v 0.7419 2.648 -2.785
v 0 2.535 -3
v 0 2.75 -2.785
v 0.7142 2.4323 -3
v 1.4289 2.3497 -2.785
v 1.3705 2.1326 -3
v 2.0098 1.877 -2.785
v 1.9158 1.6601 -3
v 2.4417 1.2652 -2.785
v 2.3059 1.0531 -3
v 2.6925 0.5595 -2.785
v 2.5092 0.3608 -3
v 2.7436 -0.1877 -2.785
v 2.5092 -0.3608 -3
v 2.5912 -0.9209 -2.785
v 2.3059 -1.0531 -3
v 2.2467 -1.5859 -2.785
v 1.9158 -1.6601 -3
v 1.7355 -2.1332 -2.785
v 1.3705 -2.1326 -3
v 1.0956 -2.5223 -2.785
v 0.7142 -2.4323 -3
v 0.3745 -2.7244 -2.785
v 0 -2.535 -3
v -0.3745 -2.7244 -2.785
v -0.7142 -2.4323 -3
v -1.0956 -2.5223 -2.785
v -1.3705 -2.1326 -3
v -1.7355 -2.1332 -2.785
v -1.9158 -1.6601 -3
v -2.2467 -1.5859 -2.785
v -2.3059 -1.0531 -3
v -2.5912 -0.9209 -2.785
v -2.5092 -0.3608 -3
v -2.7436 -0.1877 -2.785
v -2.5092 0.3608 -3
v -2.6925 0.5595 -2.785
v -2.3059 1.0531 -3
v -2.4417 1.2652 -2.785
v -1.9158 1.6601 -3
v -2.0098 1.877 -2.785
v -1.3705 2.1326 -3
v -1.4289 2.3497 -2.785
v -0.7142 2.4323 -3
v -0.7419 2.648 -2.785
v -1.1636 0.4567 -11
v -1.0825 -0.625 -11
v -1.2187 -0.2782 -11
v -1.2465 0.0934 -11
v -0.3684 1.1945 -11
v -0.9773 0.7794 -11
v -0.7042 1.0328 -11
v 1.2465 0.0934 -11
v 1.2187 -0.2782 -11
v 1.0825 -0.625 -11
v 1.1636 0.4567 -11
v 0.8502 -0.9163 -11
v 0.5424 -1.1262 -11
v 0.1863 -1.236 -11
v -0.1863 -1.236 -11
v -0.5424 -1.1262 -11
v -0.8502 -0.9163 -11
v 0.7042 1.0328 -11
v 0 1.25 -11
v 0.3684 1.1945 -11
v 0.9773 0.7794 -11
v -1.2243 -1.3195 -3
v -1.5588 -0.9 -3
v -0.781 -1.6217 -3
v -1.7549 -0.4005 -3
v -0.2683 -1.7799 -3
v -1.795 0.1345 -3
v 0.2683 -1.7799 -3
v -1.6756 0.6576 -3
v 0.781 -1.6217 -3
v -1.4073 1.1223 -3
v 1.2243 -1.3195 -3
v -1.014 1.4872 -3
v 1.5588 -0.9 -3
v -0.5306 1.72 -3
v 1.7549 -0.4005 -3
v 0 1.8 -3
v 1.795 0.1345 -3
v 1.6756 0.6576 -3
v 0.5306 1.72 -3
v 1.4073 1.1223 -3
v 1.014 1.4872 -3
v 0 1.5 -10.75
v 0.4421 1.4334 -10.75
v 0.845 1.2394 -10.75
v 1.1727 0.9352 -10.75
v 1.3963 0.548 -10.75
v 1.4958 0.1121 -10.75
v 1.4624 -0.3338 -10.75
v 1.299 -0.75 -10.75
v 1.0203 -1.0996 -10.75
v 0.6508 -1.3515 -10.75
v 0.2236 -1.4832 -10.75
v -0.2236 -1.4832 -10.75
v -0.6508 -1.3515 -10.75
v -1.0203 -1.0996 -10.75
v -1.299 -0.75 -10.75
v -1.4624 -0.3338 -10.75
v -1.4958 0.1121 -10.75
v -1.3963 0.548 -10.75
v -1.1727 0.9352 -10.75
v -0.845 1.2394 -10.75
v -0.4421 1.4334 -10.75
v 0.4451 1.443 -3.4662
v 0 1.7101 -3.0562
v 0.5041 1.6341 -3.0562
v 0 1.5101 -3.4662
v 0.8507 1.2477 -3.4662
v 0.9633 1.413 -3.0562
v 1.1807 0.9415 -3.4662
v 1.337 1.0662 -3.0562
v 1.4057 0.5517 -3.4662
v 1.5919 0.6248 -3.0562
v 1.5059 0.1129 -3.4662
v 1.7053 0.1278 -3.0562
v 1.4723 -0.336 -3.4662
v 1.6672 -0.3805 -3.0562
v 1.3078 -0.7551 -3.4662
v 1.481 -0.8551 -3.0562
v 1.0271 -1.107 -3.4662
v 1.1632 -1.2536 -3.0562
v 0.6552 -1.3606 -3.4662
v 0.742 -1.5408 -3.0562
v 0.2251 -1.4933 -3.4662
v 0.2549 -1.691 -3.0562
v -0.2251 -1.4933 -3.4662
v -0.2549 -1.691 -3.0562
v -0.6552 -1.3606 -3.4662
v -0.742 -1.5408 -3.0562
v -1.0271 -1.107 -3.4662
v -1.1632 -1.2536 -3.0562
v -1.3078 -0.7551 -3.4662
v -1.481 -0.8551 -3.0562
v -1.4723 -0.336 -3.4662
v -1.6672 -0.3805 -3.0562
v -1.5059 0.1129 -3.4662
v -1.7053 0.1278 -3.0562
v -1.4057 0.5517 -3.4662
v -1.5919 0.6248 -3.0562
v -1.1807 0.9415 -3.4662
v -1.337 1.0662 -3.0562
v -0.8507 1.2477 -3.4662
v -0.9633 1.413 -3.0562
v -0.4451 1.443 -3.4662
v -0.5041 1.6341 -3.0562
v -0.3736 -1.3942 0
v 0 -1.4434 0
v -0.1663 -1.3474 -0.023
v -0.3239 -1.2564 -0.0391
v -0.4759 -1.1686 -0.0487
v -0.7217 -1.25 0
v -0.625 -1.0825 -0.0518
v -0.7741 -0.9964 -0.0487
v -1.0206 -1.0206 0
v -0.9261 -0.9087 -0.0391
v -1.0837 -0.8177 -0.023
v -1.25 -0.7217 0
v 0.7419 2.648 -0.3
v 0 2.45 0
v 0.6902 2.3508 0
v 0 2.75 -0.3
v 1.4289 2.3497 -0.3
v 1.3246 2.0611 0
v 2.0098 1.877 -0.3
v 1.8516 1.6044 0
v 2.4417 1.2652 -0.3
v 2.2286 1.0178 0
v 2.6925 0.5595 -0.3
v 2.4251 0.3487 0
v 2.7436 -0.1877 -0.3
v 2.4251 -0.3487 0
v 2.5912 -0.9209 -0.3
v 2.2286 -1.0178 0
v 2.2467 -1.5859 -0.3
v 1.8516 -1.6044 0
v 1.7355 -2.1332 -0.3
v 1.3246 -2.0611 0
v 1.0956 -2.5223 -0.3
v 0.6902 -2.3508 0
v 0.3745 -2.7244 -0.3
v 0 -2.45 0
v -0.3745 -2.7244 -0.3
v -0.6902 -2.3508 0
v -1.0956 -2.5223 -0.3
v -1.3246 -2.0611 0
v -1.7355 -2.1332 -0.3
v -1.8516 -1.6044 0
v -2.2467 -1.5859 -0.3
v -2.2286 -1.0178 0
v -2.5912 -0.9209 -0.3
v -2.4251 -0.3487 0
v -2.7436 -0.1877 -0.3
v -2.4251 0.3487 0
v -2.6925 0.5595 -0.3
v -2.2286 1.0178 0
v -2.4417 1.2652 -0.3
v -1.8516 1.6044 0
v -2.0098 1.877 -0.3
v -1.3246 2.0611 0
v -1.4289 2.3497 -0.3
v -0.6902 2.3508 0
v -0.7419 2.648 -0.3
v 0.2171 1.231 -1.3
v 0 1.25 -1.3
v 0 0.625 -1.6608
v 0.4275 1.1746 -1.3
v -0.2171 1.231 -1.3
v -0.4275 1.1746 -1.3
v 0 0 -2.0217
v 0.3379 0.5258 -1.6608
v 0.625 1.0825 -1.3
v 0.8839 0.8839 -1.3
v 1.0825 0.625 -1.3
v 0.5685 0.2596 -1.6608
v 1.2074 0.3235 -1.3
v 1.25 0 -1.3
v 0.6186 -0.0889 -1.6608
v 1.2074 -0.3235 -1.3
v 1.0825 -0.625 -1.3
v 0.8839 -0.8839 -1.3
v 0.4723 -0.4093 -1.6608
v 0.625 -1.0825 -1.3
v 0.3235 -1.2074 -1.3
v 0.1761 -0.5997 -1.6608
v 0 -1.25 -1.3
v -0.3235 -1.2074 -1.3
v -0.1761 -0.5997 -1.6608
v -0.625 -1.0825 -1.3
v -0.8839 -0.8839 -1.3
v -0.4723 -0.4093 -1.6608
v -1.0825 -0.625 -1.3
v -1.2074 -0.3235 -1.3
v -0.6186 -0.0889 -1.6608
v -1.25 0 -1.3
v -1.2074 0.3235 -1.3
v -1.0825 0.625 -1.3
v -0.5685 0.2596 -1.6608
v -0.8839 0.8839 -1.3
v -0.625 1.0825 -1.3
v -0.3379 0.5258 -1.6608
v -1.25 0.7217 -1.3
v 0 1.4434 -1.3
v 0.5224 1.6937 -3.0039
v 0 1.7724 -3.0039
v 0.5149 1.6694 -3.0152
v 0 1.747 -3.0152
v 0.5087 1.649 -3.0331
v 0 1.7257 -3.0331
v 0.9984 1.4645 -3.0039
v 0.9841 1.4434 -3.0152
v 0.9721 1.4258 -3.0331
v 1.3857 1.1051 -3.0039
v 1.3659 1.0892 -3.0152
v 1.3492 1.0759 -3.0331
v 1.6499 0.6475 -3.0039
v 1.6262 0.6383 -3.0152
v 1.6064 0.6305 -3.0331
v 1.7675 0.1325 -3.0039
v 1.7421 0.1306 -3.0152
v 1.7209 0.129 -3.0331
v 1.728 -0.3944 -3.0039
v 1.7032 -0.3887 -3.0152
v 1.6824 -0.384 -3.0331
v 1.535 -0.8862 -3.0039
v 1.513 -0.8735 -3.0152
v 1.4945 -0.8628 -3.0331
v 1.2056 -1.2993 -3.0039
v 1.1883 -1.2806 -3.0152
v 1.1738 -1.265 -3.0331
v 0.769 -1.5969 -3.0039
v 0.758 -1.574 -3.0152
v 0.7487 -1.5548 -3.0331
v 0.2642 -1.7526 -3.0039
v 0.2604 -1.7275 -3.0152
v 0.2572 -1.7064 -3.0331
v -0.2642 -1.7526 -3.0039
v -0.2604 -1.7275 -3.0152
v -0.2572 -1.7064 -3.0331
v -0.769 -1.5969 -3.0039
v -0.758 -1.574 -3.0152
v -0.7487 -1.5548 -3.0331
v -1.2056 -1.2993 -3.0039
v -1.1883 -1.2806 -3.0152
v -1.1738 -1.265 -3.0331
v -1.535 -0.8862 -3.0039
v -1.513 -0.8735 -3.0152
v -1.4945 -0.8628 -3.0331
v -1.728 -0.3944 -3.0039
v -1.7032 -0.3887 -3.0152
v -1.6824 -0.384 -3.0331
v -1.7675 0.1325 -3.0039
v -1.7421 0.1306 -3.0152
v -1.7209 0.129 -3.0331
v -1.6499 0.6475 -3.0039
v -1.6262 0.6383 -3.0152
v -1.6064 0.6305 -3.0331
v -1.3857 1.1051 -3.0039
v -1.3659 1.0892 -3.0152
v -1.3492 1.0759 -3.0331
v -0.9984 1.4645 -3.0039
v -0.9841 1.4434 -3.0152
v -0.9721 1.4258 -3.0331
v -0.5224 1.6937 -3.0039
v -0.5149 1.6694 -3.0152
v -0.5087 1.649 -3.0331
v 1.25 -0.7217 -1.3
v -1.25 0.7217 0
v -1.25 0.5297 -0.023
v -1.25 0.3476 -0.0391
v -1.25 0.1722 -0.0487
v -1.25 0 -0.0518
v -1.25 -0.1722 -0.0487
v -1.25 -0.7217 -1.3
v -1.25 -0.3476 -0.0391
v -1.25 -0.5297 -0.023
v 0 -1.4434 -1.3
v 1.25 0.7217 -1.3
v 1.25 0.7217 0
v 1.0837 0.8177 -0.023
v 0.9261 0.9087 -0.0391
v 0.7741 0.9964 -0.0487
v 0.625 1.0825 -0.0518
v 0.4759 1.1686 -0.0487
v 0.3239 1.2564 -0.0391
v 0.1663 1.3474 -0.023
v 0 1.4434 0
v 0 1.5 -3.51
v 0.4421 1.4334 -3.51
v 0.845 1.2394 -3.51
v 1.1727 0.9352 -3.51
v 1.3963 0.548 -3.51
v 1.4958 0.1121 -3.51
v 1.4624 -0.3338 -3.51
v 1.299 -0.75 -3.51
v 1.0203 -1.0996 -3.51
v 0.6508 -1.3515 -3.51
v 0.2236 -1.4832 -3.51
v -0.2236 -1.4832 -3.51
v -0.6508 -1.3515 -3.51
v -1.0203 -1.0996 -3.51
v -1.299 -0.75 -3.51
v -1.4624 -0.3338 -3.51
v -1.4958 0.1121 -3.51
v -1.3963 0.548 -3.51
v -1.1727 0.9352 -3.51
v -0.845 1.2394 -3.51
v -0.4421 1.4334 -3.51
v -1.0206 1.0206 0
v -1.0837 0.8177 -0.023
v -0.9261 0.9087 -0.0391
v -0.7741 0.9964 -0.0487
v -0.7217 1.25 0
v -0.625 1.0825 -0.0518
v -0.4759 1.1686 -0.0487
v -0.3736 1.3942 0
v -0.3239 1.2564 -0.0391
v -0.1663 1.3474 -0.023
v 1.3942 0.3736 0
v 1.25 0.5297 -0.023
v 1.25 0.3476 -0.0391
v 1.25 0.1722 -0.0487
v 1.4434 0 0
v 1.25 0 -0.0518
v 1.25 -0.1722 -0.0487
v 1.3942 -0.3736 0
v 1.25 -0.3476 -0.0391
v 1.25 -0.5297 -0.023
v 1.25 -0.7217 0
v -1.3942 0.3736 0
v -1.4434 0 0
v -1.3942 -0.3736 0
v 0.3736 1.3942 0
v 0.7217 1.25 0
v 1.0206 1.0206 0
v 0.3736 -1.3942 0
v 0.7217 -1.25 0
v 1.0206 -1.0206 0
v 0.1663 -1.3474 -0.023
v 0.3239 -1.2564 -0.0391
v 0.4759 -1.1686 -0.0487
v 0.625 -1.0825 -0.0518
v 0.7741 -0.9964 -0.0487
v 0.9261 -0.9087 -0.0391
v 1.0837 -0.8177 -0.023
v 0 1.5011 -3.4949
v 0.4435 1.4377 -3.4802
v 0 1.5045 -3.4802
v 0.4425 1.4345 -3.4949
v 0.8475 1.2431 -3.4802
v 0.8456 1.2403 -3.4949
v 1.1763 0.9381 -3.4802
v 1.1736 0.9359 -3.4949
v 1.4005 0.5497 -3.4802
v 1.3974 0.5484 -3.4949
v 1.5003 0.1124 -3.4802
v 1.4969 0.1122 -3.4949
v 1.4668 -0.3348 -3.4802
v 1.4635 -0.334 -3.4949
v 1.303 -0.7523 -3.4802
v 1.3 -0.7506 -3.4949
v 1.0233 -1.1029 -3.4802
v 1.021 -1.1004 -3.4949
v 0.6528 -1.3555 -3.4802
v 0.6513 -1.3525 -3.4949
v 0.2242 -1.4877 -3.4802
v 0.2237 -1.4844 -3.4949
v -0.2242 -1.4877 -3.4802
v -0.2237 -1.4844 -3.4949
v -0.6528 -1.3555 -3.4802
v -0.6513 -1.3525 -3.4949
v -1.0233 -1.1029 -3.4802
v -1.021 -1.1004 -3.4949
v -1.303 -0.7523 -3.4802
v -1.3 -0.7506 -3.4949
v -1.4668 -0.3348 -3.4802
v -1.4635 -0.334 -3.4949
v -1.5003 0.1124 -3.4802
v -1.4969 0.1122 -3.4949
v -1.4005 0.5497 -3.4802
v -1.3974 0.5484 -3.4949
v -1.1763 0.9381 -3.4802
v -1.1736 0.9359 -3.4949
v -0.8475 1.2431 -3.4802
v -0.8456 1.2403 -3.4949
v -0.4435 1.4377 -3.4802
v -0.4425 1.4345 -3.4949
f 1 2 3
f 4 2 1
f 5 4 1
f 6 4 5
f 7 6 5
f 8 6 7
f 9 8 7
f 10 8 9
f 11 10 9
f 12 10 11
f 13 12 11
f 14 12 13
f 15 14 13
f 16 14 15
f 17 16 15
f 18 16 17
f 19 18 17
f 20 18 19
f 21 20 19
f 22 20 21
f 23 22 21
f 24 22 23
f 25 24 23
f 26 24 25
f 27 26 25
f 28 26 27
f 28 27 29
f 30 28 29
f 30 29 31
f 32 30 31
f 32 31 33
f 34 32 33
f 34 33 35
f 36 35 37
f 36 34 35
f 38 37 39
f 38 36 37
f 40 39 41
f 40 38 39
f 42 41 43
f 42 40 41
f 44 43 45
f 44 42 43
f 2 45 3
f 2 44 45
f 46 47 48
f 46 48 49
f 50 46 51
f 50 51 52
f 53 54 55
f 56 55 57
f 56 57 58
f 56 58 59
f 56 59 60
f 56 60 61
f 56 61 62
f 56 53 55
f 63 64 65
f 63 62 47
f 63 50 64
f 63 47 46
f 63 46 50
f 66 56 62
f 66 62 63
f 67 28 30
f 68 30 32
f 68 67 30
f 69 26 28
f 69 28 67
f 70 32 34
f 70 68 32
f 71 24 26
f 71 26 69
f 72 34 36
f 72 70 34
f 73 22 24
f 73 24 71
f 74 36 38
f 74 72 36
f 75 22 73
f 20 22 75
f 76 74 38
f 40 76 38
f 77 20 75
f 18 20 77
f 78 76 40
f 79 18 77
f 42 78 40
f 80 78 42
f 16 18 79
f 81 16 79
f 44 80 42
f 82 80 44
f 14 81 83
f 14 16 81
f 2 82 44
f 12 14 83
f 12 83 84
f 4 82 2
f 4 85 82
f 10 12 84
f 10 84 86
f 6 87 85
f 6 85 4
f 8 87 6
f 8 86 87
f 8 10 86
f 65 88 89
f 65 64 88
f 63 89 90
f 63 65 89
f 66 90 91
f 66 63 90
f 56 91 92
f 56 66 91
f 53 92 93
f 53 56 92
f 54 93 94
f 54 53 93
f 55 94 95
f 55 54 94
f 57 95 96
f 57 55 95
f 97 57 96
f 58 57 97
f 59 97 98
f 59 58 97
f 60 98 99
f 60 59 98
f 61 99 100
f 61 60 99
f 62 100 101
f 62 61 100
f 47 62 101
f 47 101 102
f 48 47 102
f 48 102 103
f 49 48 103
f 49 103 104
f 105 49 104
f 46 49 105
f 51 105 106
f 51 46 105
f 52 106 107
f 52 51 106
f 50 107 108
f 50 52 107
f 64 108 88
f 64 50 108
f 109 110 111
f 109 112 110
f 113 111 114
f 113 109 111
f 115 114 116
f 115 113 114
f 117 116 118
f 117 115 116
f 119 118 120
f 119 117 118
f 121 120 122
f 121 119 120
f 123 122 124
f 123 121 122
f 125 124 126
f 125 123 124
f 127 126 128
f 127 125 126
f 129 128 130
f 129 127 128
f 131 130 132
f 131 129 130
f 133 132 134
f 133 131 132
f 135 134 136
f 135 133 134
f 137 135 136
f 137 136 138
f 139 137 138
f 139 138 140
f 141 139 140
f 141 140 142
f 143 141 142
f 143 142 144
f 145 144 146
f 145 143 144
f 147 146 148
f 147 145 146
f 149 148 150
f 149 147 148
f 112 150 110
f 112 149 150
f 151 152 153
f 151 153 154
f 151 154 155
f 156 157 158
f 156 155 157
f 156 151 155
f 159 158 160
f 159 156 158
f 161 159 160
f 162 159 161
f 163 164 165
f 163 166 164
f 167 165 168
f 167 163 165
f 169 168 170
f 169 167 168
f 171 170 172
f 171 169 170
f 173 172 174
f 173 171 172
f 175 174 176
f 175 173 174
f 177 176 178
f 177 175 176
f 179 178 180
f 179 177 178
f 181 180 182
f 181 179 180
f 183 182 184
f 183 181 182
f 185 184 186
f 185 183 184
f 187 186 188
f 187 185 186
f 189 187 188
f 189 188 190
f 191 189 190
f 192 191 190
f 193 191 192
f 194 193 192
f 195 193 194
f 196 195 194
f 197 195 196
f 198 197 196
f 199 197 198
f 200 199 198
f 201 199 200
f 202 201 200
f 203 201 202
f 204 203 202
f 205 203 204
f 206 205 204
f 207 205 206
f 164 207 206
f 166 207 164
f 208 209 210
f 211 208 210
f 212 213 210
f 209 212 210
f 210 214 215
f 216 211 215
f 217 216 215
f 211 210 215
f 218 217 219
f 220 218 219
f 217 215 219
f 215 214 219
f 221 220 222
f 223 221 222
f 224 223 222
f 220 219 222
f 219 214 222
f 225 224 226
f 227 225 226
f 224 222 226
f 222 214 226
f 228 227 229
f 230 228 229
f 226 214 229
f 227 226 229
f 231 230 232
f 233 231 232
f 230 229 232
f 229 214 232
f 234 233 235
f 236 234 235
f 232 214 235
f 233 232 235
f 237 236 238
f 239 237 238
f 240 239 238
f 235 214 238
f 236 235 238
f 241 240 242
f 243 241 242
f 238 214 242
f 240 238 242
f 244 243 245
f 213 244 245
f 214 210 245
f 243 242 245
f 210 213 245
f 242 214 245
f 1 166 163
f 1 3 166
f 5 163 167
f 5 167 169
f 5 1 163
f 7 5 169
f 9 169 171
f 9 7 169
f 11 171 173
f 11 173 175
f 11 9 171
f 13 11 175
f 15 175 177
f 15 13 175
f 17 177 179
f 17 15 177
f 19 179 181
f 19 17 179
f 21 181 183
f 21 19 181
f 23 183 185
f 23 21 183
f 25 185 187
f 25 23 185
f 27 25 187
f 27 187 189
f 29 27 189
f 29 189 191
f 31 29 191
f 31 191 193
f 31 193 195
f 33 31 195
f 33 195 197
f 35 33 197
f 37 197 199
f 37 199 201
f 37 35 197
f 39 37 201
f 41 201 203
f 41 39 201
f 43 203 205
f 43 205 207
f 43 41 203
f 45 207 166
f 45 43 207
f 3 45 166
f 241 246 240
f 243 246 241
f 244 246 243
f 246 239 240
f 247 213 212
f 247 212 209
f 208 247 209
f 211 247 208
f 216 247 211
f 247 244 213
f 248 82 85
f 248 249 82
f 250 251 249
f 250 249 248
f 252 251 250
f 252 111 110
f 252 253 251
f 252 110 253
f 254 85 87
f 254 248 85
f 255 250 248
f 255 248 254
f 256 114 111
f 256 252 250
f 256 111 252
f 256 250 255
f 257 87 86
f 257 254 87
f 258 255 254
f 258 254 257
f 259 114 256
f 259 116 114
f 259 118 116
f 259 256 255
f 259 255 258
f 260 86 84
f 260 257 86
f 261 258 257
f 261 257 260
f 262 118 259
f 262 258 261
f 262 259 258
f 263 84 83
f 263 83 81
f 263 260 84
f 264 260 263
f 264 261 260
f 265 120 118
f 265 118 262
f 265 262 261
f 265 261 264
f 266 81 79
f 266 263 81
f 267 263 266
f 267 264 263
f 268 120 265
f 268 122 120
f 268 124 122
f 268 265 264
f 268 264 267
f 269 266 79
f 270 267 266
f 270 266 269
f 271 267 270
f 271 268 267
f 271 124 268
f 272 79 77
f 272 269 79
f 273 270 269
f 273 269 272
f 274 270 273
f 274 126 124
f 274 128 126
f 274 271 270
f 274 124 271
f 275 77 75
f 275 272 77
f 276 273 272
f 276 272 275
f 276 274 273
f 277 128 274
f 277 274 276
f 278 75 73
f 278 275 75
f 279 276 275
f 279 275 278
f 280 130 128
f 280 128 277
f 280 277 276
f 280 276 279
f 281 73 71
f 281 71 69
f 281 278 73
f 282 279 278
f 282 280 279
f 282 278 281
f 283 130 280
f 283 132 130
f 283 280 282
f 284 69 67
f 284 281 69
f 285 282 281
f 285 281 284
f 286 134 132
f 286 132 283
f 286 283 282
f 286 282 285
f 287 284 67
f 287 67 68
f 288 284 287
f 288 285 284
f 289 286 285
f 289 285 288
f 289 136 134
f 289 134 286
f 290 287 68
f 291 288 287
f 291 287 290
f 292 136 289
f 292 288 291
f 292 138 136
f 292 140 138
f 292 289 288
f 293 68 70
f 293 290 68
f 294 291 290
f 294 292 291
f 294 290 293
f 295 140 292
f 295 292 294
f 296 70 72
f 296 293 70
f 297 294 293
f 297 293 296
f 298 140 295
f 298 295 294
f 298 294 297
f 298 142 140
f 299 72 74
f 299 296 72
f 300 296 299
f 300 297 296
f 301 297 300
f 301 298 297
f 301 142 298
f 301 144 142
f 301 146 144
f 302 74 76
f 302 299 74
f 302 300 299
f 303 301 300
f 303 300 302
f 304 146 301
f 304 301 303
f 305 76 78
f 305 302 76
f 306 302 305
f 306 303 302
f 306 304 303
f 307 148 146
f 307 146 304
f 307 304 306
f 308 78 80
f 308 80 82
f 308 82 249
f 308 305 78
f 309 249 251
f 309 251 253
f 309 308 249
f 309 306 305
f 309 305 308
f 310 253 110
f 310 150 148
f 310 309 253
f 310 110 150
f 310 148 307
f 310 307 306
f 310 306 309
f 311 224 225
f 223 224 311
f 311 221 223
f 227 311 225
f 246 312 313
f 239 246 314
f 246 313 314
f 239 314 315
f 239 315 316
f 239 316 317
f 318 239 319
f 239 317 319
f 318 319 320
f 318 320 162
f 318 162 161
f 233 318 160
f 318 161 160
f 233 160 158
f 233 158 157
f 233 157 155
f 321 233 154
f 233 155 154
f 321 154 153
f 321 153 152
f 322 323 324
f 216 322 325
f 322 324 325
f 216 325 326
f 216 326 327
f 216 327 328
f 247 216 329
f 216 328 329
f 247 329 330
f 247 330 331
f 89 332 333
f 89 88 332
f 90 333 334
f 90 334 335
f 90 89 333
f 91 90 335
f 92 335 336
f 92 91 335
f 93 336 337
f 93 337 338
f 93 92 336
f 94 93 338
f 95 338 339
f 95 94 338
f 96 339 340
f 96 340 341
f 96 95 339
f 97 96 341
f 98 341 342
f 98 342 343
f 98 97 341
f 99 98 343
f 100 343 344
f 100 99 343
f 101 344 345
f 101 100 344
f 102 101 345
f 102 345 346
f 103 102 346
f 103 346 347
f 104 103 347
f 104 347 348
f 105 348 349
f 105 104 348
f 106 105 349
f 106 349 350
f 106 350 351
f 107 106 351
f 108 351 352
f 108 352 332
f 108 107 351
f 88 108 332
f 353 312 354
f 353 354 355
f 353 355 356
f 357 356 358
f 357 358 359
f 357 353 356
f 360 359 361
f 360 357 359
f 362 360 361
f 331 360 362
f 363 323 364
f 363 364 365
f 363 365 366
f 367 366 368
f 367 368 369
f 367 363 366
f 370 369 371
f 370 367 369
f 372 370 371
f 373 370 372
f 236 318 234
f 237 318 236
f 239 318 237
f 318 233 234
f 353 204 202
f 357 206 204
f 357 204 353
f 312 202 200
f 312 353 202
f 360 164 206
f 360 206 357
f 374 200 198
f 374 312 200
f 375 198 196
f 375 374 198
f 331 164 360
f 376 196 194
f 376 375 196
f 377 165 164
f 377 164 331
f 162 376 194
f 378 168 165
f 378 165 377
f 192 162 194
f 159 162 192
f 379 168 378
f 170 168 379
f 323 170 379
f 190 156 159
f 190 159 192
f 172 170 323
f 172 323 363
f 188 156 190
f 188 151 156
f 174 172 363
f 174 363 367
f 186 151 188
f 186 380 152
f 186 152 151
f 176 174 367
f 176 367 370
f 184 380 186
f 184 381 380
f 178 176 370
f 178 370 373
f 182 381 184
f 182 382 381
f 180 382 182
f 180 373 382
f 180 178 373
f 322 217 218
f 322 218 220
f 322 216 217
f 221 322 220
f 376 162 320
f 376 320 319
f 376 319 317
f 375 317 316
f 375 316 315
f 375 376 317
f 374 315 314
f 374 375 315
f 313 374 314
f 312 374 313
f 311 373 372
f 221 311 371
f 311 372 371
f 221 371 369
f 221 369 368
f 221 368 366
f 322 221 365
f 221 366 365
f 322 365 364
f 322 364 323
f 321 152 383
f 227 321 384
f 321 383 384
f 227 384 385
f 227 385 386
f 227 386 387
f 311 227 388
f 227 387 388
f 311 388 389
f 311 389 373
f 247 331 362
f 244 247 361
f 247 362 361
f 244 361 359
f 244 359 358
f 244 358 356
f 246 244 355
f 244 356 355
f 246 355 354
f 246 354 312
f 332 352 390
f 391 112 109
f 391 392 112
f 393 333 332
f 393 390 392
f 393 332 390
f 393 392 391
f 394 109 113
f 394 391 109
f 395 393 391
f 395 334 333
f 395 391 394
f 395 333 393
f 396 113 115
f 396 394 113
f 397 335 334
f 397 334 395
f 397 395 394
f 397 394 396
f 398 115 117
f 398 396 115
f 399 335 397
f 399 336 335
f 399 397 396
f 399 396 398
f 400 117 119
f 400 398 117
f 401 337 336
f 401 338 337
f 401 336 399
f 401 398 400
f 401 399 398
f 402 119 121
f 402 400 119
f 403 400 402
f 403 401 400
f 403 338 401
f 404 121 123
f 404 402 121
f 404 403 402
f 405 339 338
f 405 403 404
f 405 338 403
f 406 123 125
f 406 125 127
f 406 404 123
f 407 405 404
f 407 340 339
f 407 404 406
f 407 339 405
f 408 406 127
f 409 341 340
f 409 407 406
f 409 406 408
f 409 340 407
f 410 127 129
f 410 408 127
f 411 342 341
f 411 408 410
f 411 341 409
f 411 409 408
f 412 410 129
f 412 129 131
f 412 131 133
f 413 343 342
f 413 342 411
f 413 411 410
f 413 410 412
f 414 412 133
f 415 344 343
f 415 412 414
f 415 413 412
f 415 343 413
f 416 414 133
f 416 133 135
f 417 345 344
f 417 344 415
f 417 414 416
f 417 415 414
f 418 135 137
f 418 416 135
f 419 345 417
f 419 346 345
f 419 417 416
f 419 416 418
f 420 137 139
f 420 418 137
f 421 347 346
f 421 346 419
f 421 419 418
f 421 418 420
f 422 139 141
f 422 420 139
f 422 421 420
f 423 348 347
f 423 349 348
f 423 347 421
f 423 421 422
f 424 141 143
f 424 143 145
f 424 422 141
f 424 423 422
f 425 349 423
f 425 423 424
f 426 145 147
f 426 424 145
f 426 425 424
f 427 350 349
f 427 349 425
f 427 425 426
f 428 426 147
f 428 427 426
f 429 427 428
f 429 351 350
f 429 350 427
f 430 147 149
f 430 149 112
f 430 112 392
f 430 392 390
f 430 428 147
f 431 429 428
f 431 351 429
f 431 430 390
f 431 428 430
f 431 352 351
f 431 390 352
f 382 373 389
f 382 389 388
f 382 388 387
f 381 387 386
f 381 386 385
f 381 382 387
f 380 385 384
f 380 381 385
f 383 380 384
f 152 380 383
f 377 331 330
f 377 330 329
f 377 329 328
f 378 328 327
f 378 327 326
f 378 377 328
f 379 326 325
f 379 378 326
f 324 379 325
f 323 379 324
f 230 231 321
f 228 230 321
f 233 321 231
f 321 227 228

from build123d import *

# Parameters (mm, degrees)
CUT_EXTRUDE1_DEPTH = 1.3


with BuildPart() as part:
    # Sketch1 → Revolve1 (revolve)
    with BuildSketch(Plane(origin=(0, 0, 0), x_dir=(0, 0, -1), z_dir=(1, 0, 0))):
        with BuildLine():
            Line((0, 0), (0, 2.45))
            Line((0, 2.45), (0.3, 2.75))
            Line((0.3, 2.75), (2.785, 2.75))
            Line((2.785, 2.75), (3, 2.535))
            Line((3, 2.535), (3, 1.8))
            ThreePointArc((3, 1.8), (3.015193643, 1.74701055), (3.056157637, 1.710123155))
            Line((3.056157637, 1.710123155), (3.466157637, 1.510123155))
            ThreePointArc((3.466157637, 1.510123155), (3.48750205, 1.50256365), (3.51, 1.5))
            Line((3.51, 1.5), (10.75, 1.5))
            Line((10.75, 1.5), (11, 1.25))
            Line((11, 1.25), (11, 0))
            Line((11, 0), (0, 0))
        make_face()
    revolve(axis=Axis((0, 0, 0), (0, 0, -1)))

    # Sketch2 → Cut-Extrude1 (cut)
    with BuildSketch(Plane.XY):
        Polygon((0, 1.443375673), (-1.25, 0.721687836), (-1.25, -0.721687836), (0, -1.443375673), (1.25, -0.721687836), (1.25, 0.721687836), align=None)
    extrude(amount=-CUT_EXTRUDE1_DEPTH, mode=Mode.SUBTRACT)

    # Sketch3 → Cut-Revolve2 (revolve, cut)
    with BuildSketch(Plane(origin=(0, 0, 0), x_dir=(0, 0, -1), z_dir=(1, 0, 0))):
        Polygon((1.3, 0), (1.3, 1.25), (2.021687836, 0), align=None)
    revolve(axis=Axis((0, 0, -1.3), (0, 0, -1)), mode=Mode.SUBTRACT)

    # Sketch4 → Cut-Revolve3 (revolve, cut)
    with BuildSketch(Plane(origin=(0, 0, 0), x_dir=(0, 0, -1), z_dir=(1, 0, 0))):
        Polygon((0, 1.443375673), (0, 1.25), (0.051814855, 1.25), align=None)
    revolve(axis=Axis((0, 0, 0), (0, 0, -1)), mode=Mode.SUBTRACT)


solid = part.part
